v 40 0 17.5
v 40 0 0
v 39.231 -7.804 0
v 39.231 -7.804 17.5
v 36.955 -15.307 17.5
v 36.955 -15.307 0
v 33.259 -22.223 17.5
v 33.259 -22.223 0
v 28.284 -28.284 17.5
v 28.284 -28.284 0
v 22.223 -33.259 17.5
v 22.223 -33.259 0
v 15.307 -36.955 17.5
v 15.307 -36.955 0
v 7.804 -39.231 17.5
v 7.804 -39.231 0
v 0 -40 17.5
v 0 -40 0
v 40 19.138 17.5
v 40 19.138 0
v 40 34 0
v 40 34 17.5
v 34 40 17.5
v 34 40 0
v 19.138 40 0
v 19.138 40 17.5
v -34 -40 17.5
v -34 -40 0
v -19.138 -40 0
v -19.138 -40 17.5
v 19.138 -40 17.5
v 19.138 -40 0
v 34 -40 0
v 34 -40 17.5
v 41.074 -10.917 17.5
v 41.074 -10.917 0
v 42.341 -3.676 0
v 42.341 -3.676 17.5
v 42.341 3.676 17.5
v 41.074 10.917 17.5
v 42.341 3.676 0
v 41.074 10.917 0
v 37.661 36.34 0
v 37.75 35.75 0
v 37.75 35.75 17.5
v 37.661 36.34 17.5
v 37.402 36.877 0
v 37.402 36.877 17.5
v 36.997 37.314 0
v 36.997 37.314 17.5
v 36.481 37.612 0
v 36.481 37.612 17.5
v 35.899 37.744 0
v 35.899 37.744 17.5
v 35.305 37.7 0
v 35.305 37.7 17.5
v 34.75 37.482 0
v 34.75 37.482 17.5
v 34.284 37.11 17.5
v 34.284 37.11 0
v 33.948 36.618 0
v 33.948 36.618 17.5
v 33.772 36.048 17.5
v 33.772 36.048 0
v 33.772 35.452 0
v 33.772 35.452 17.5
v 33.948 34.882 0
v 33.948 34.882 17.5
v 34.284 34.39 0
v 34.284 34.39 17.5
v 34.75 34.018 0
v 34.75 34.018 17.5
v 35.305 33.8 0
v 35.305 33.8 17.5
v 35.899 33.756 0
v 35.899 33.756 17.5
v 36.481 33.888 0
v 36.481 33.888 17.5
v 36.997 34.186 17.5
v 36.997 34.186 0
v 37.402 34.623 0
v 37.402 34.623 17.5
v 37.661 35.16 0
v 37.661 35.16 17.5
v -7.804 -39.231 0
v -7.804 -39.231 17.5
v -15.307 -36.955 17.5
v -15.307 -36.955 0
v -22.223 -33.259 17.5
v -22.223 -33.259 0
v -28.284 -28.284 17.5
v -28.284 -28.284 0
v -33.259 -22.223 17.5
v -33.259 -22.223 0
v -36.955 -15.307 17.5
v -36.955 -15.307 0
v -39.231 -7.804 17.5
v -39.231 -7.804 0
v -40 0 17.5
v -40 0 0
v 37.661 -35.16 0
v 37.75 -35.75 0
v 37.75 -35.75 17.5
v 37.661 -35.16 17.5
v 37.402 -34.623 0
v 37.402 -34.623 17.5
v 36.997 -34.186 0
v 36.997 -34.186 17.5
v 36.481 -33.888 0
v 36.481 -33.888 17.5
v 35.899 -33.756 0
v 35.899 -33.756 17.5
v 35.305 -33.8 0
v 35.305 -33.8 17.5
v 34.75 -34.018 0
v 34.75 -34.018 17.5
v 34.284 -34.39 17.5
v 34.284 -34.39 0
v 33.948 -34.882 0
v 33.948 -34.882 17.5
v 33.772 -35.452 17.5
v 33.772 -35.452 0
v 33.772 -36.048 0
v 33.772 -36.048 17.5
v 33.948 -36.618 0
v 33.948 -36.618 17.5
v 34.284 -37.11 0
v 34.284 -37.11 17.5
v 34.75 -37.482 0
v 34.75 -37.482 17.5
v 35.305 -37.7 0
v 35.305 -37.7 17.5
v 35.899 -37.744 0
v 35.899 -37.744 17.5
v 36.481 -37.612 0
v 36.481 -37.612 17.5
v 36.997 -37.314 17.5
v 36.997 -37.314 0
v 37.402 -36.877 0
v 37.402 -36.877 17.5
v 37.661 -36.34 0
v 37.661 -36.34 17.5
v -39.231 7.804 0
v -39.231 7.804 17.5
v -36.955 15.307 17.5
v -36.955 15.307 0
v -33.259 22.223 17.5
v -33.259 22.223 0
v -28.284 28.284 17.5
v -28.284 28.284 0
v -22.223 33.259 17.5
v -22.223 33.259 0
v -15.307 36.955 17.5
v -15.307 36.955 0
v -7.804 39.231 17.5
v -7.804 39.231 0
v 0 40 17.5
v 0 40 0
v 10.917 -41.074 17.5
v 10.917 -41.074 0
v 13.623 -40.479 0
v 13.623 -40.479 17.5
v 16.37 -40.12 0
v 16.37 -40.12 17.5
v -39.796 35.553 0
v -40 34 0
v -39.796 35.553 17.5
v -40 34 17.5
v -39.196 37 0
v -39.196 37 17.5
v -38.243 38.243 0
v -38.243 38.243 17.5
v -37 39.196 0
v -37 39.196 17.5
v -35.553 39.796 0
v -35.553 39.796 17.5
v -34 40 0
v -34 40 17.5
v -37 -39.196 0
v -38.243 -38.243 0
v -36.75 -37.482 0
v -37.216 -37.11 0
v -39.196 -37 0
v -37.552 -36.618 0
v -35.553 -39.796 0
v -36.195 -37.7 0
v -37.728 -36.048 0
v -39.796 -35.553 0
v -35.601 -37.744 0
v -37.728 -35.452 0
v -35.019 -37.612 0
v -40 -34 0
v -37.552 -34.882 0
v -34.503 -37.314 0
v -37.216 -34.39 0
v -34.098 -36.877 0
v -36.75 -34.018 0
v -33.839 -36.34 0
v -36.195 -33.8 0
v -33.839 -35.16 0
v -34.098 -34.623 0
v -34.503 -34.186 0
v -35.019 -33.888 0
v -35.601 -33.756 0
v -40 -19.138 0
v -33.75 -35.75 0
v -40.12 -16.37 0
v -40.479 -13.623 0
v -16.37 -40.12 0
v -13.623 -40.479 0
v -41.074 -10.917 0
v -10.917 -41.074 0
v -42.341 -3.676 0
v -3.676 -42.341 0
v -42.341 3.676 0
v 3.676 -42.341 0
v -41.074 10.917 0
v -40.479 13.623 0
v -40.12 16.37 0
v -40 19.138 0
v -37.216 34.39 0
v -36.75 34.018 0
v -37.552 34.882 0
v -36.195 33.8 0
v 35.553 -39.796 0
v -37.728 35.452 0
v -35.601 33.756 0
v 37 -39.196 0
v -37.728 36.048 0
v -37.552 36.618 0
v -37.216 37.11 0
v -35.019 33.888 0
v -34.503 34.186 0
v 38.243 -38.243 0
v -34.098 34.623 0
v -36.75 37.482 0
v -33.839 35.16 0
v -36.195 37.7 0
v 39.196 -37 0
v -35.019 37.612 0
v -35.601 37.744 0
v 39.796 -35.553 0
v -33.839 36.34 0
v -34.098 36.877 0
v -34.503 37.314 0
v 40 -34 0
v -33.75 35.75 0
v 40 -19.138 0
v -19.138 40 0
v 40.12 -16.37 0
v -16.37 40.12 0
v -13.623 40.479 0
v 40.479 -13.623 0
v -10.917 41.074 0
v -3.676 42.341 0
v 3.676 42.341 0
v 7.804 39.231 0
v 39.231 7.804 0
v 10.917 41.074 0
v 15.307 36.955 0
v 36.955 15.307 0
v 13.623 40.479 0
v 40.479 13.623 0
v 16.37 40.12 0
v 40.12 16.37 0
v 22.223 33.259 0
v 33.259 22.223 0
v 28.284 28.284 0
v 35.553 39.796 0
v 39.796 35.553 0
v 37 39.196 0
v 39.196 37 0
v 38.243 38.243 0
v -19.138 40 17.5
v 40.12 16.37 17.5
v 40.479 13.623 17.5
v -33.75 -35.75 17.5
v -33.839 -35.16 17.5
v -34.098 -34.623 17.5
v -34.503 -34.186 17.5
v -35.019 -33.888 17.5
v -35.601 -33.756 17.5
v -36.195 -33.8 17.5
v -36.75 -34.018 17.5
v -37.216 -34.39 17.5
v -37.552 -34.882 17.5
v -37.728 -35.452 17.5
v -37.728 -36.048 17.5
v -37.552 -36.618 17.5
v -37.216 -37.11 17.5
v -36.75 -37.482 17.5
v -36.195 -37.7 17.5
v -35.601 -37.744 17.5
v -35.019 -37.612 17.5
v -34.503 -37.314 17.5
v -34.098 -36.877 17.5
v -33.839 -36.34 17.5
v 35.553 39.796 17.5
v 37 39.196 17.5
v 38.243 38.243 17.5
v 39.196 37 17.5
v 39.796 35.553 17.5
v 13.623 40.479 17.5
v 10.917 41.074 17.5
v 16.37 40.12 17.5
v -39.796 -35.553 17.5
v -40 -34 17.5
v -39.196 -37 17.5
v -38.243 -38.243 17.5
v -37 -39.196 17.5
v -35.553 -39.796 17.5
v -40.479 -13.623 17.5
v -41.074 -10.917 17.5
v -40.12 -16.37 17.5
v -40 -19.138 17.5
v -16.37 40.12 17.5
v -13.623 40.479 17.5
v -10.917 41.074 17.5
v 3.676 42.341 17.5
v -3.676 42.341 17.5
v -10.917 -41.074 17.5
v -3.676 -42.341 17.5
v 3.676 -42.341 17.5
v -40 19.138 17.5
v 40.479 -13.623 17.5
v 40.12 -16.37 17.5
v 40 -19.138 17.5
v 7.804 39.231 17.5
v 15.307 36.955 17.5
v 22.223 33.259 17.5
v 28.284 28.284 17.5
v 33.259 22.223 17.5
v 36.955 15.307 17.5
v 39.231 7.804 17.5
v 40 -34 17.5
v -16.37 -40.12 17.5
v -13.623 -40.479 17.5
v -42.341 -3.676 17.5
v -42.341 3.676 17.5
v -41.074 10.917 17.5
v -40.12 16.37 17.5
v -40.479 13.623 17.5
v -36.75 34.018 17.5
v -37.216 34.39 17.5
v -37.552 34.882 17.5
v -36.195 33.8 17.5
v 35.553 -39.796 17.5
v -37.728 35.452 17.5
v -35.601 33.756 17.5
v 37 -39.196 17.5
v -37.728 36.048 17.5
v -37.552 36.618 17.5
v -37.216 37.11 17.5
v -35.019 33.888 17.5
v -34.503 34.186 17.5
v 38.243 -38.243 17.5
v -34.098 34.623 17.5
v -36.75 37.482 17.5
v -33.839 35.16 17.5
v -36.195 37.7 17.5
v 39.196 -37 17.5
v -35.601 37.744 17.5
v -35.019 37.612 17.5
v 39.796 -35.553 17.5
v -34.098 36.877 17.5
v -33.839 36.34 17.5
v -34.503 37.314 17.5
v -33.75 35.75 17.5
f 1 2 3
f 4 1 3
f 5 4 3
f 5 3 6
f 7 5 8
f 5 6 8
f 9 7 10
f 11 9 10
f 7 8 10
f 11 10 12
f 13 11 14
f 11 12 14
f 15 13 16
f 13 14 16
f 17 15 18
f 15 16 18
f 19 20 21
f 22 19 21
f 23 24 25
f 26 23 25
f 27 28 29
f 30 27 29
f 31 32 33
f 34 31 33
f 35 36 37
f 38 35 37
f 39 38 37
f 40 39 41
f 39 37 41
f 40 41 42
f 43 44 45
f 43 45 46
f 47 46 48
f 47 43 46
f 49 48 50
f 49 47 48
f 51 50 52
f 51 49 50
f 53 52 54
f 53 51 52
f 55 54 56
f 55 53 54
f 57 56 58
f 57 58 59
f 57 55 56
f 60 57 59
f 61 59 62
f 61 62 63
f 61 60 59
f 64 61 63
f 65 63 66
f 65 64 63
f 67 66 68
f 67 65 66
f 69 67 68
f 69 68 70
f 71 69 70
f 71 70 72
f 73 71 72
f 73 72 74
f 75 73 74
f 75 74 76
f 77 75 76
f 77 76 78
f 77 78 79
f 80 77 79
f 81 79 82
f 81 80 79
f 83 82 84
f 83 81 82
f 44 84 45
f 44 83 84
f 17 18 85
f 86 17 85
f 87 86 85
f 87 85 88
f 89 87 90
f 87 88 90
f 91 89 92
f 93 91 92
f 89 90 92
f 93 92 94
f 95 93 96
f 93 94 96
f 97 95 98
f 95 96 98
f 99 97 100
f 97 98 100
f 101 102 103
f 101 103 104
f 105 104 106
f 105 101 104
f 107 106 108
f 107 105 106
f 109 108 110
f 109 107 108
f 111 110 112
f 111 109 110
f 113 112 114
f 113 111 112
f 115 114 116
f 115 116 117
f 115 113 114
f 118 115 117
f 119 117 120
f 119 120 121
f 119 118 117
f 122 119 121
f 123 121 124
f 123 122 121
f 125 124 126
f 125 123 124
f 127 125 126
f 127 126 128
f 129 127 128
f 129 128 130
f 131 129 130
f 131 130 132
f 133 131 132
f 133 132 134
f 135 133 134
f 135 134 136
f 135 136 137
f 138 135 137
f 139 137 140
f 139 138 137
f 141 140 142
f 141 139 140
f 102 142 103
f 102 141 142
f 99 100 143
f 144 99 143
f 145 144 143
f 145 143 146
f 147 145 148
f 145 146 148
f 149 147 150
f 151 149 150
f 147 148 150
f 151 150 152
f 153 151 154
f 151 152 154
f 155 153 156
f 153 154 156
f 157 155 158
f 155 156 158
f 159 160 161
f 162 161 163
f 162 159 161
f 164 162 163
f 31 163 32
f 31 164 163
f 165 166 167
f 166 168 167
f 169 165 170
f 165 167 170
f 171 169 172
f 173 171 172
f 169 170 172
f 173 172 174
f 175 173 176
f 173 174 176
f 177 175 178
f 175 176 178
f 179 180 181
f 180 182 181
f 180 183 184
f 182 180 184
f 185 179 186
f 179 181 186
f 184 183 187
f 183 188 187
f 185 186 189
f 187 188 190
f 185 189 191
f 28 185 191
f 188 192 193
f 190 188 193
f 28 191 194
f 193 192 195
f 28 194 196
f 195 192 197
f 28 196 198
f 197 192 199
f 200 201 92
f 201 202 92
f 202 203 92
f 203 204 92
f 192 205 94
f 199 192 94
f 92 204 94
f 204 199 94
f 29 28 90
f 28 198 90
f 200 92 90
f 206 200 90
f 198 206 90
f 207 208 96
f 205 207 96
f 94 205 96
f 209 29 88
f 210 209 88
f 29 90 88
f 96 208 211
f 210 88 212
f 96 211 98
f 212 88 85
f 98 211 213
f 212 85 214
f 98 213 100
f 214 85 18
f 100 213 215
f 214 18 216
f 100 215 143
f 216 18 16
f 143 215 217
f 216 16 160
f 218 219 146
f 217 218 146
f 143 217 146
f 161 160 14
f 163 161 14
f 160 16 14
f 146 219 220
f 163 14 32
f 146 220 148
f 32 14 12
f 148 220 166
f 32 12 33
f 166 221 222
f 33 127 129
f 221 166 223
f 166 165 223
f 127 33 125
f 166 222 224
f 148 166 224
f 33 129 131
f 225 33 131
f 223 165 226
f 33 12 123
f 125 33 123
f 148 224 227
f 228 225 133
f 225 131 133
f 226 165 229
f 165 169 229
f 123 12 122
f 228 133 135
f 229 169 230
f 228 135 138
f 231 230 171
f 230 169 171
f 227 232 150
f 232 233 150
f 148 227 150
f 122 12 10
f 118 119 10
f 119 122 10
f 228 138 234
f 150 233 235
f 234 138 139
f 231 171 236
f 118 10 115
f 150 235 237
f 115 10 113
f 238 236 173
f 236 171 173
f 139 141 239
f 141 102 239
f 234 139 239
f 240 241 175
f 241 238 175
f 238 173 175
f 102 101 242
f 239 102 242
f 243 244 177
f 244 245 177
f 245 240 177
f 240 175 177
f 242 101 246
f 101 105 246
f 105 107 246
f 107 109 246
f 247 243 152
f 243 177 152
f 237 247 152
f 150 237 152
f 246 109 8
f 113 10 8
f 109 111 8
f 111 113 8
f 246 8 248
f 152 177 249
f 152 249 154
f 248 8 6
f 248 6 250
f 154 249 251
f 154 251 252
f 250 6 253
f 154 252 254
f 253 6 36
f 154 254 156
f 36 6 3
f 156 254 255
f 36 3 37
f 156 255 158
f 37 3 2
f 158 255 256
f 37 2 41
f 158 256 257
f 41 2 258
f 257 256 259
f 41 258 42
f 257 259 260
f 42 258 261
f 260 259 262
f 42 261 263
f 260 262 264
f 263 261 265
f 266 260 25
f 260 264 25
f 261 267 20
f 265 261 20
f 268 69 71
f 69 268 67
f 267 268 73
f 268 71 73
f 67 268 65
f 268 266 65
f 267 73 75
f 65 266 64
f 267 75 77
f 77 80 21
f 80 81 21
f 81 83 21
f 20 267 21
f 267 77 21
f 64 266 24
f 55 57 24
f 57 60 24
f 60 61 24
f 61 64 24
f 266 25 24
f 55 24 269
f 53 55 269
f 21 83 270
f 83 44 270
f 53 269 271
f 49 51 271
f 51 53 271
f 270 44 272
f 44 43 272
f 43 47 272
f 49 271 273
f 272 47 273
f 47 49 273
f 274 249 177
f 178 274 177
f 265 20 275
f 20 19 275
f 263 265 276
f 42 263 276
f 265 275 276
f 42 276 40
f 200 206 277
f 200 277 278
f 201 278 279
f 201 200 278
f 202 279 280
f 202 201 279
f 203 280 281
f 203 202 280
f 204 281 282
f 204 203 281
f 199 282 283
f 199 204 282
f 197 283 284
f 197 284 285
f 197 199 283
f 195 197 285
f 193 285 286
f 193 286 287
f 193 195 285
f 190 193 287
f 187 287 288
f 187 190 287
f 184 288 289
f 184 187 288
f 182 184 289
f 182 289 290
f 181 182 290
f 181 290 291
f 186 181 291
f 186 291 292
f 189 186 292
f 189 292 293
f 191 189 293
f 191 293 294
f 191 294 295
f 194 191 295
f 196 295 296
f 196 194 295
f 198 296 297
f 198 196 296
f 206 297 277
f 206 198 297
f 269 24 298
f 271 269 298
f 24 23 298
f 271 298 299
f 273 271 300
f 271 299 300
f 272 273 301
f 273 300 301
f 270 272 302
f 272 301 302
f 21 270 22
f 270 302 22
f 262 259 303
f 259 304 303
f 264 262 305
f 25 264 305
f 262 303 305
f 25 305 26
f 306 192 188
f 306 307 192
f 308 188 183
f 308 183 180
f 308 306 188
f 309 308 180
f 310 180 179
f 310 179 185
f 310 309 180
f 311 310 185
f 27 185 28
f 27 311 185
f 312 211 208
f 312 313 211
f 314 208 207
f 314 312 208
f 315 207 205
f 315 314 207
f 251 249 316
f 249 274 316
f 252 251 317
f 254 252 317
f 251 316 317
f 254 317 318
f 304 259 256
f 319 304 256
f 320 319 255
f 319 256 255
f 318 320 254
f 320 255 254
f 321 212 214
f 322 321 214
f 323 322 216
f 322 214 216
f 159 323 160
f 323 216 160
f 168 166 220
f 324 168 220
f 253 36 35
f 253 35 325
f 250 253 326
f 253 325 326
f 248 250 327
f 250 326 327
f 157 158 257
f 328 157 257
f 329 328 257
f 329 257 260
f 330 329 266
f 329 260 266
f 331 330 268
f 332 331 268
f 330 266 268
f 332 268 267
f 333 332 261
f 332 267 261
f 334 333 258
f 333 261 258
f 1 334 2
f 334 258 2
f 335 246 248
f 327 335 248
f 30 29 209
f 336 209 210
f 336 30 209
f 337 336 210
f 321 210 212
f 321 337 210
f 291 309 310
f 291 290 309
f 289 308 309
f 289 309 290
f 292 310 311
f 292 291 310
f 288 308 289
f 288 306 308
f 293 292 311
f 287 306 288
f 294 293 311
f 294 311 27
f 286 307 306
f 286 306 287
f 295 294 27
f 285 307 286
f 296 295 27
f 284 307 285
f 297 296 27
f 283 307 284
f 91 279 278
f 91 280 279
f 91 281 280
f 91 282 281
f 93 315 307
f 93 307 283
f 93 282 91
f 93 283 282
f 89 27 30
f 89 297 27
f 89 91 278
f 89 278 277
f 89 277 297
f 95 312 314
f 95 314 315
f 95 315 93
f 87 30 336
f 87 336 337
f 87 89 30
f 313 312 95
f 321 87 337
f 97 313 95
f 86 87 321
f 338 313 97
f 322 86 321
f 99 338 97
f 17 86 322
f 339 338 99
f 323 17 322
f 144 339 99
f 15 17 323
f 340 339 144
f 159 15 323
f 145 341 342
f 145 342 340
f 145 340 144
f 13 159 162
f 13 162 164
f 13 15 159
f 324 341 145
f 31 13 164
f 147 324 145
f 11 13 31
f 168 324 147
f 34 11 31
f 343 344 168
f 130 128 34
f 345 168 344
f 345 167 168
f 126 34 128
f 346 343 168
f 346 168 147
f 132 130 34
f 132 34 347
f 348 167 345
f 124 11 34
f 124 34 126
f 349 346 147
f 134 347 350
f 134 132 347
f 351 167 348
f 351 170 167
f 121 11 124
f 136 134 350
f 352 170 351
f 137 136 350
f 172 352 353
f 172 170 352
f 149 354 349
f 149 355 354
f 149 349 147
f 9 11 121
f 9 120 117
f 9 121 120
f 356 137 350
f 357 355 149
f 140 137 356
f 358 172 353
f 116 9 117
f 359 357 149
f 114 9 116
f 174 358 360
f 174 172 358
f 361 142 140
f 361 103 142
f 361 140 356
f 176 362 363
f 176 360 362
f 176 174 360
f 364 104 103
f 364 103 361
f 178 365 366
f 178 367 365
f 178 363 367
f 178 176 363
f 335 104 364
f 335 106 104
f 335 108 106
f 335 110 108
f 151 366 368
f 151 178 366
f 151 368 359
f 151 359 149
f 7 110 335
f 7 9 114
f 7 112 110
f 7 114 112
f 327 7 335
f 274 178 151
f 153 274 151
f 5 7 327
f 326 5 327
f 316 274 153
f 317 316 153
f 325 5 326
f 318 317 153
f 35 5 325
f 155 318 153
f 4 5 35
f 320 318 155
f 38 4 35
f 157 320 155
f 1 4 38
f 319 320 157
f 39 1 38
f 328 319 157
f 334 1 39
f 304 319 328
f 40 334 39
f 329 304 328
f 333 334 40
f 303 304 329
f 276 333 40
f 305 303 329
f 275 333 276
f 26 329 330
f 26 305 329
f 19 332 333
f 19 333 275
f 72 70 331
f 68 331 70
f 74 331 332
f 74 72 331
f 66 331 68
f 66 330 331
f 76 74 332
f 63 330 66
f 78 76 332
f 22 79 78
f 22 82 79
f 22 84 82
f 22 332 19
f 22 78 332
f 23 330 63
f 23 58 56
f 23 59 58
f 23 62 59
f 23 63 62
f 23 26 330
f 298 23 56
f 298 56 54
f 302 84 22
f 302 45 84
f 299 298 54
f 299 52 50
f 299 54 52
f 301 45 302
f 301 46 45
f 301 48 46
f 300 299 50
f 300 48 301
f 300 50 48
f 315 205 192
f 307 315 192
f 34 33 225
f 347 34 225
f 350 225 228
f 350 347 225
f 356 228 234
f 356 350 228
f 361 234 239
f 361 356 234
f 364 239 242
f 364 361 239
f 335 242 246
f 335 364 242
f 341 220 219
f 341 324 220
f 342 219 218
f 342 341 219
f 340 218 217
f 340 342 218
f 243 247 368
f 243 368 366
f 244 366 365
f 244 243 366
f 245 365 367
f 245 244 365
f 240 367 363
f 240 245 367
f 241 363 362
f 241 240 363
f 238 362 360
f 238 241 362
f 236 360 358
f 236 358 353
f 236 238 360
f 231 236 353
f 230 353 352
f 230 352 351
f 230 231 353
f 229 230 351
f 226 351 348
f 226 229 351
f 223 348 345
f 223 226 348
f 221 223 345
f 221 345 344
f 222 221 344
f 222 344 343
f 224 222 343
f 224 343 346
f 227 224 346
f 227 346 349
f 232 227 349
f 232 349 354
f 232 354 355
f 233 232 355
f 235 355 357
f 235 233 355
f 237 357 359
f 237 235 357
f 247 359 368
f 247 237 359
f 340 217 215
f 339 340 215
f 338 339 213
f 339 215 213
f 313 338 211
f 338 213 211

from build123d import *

# Parameters (mm, degrees)
F0_R     = 2
F1_DEPTH = 17.5
F2_R     = 6
F3_R     = 32


with BuildPart() as f1:
    # F0 (on Top) → F1 (new body)
    with BuildSketch(Plane.XY):
        with BuildLine():
            Line((40, 14.3614066163), (40, 40))
            Line((40, 40), (14.3614066163, 40))
            ThreePointArc((14.3614066163, 40), (30.0520382004, 30.0520382004), (40, 14.3614066163))
        make_face()
        with Locations((35.75, 35.75)):
            Circle(F0_R, mode=Mode.SUBTRACT)
        with BuildLine():
            ThreePointArc((40, 14.3614066163), (30.0520382004, 30.0520382004), (14.3614066163, 40))
            Line((14.3614066163, 40), (0, 40))
            ThreePointArc((0, 40), (28.2842712475, 28.2842712475), (40, 0))
            Line((40, 0), (40, 14.3614066163))
        make_face()
        with BuildLine():
            Line((0, 40), (14.3614066163, 40))
            ThreePointArc((14.3614066163, 40), (0, 42.5), (-14.3614066163, 40))
            Line((-14.3614066163, 40), (0, 40))
        make_face()
        with BuildLine():
            ThreePointArc((42.5, 0), (41.8703355611, 7.2886898686), (40, 14.3614066163))
            Line((40, 14.3614066163), (40, 0))
            Line((40, 0), (40, -14.3614066163))
            ThreePointArc((40, -14.3614066163), (41.8703355611, -7.2886898686), (42.5, 0))
        make_face()
        with BuildLine():
            ThreePointArc((-40, 0), (-28.2842712475, 28.2842712475), (0, 40))
            Line((0, 40), (-14.3614066163, 40))
            ThreePointArc((-14.3614066163, 40), (-30.0520382004, 30.0520382004), (-40, 14.3614066163))
            Line((-40, 14.3614066163), (-40, 0))
        make_face()
        with BuildLine():
            ThreePointArc((-40, 14.3614066163), (-30.0520382004, 30.0520382004), (-14.3614066163, 40))
            Line((-14.3614066163, 40), (-40, 40))
            Line((-40, 40), (-40, 14.3614066163))
        make_face()
        with Locations((-35.75, 35.75)):
            Circle(F0_R, mode=Mode.SUBTRACT)
        with BuildLine():
            Line((40, -14.3614066163), (40, 0))
            ThreePointArc((40, 0), (28.2842712475, -28.2842712475), (0, -40))
            Line((0, -40), (14.3614066163, -40))
            ThreePointArc((14.3614066163, -40), (30.0520382004, -30.0520382004), (40, -14.3614066163))
        make_face()
        with BuildLine():
            Line((-40, -14.3614066163), (-40, 0))
            Line((-40, 0), (-40, 14.3614066163))
            ThreePointArc((-40, 14.3614066163), (-42.5, 0), (-40, -14.3614066163))
        make_face()
        with BuildLine():
            ThreePointArc((0, -40), (-28.2842712475, -28.2842712475), (-40, 0))
            Line((-40, 0), (-40, -14.3614066163))
            ThreePointArc((-40, -14.3614066163), (-30.0520382004, -30.0520382004), (-14.3614066163, -40))
            Line((-14.3614066163, -40), (0, -40))
        make_face()
        with BuildLine():
            Line((40, -40), (40, -14.3614066163))
            ThreePointArc((40, -14.3614066163), (30.0520382004, -30.0520382004), (14.3614066163, -40))
            Line((14.3614066163, -40), (40, -40))
        make_face()
        with Locations((35.75, -35.75)):
            Circle(F0_R, mode=Mode.SUBTRACT)
        with BuildLine():
            Line((14.3614066163, -40), (0, -40))
            Line((0, -40), (-14.3614066163, -40))
            ThreePointArc((-14.3614066163, -40), (0, -42.5), (14.3614066163, -40))
        make_face()
        with BuildLine():
            ThreePointArc((-14.3614066163, -40), (-30.0520382004, -30.0520382004), (-40, -14.3614066163))
            Line((-40, -14.3614066163), (-40, -40))
            Line((-40, -40), (-14.3614066163, -40))
        make_face()
        with Locations((-35.75, -35.75)):
            Circle(F0_R, mode=Mode.SUBTRACT)
    extrude(amount=F1_DEPTH)

    # F2
    f2_edges = [f1.edges().sort_by_distance(p)[0] for p in [
        (-40, -40, 8.75),
        (40, -40, 8.75),
        (-40, 40, 8.75),
        (40, 40, 8.75),
    ]]
    fillet(f2_edges, radius=F2_R)

    # F3
    f3_edges = [f1.edges().sort_by_distance(p)[0] for p in [
        (-40, 14.361407, 8.75),
        (-40, -14.361407, 8.75),
        (-14.361407, -40, 8.75),
        (14.361407, -40, 8.75),
        (40, -14.361407, 8.75),
        (40, 14.361407, 8.75),
        (14.361407, 40, 8.75),
        (-14.361407, 40, 8.75),
    ]]
    fillet(f3_edges, radius=F3_R)


solid = f1.part
